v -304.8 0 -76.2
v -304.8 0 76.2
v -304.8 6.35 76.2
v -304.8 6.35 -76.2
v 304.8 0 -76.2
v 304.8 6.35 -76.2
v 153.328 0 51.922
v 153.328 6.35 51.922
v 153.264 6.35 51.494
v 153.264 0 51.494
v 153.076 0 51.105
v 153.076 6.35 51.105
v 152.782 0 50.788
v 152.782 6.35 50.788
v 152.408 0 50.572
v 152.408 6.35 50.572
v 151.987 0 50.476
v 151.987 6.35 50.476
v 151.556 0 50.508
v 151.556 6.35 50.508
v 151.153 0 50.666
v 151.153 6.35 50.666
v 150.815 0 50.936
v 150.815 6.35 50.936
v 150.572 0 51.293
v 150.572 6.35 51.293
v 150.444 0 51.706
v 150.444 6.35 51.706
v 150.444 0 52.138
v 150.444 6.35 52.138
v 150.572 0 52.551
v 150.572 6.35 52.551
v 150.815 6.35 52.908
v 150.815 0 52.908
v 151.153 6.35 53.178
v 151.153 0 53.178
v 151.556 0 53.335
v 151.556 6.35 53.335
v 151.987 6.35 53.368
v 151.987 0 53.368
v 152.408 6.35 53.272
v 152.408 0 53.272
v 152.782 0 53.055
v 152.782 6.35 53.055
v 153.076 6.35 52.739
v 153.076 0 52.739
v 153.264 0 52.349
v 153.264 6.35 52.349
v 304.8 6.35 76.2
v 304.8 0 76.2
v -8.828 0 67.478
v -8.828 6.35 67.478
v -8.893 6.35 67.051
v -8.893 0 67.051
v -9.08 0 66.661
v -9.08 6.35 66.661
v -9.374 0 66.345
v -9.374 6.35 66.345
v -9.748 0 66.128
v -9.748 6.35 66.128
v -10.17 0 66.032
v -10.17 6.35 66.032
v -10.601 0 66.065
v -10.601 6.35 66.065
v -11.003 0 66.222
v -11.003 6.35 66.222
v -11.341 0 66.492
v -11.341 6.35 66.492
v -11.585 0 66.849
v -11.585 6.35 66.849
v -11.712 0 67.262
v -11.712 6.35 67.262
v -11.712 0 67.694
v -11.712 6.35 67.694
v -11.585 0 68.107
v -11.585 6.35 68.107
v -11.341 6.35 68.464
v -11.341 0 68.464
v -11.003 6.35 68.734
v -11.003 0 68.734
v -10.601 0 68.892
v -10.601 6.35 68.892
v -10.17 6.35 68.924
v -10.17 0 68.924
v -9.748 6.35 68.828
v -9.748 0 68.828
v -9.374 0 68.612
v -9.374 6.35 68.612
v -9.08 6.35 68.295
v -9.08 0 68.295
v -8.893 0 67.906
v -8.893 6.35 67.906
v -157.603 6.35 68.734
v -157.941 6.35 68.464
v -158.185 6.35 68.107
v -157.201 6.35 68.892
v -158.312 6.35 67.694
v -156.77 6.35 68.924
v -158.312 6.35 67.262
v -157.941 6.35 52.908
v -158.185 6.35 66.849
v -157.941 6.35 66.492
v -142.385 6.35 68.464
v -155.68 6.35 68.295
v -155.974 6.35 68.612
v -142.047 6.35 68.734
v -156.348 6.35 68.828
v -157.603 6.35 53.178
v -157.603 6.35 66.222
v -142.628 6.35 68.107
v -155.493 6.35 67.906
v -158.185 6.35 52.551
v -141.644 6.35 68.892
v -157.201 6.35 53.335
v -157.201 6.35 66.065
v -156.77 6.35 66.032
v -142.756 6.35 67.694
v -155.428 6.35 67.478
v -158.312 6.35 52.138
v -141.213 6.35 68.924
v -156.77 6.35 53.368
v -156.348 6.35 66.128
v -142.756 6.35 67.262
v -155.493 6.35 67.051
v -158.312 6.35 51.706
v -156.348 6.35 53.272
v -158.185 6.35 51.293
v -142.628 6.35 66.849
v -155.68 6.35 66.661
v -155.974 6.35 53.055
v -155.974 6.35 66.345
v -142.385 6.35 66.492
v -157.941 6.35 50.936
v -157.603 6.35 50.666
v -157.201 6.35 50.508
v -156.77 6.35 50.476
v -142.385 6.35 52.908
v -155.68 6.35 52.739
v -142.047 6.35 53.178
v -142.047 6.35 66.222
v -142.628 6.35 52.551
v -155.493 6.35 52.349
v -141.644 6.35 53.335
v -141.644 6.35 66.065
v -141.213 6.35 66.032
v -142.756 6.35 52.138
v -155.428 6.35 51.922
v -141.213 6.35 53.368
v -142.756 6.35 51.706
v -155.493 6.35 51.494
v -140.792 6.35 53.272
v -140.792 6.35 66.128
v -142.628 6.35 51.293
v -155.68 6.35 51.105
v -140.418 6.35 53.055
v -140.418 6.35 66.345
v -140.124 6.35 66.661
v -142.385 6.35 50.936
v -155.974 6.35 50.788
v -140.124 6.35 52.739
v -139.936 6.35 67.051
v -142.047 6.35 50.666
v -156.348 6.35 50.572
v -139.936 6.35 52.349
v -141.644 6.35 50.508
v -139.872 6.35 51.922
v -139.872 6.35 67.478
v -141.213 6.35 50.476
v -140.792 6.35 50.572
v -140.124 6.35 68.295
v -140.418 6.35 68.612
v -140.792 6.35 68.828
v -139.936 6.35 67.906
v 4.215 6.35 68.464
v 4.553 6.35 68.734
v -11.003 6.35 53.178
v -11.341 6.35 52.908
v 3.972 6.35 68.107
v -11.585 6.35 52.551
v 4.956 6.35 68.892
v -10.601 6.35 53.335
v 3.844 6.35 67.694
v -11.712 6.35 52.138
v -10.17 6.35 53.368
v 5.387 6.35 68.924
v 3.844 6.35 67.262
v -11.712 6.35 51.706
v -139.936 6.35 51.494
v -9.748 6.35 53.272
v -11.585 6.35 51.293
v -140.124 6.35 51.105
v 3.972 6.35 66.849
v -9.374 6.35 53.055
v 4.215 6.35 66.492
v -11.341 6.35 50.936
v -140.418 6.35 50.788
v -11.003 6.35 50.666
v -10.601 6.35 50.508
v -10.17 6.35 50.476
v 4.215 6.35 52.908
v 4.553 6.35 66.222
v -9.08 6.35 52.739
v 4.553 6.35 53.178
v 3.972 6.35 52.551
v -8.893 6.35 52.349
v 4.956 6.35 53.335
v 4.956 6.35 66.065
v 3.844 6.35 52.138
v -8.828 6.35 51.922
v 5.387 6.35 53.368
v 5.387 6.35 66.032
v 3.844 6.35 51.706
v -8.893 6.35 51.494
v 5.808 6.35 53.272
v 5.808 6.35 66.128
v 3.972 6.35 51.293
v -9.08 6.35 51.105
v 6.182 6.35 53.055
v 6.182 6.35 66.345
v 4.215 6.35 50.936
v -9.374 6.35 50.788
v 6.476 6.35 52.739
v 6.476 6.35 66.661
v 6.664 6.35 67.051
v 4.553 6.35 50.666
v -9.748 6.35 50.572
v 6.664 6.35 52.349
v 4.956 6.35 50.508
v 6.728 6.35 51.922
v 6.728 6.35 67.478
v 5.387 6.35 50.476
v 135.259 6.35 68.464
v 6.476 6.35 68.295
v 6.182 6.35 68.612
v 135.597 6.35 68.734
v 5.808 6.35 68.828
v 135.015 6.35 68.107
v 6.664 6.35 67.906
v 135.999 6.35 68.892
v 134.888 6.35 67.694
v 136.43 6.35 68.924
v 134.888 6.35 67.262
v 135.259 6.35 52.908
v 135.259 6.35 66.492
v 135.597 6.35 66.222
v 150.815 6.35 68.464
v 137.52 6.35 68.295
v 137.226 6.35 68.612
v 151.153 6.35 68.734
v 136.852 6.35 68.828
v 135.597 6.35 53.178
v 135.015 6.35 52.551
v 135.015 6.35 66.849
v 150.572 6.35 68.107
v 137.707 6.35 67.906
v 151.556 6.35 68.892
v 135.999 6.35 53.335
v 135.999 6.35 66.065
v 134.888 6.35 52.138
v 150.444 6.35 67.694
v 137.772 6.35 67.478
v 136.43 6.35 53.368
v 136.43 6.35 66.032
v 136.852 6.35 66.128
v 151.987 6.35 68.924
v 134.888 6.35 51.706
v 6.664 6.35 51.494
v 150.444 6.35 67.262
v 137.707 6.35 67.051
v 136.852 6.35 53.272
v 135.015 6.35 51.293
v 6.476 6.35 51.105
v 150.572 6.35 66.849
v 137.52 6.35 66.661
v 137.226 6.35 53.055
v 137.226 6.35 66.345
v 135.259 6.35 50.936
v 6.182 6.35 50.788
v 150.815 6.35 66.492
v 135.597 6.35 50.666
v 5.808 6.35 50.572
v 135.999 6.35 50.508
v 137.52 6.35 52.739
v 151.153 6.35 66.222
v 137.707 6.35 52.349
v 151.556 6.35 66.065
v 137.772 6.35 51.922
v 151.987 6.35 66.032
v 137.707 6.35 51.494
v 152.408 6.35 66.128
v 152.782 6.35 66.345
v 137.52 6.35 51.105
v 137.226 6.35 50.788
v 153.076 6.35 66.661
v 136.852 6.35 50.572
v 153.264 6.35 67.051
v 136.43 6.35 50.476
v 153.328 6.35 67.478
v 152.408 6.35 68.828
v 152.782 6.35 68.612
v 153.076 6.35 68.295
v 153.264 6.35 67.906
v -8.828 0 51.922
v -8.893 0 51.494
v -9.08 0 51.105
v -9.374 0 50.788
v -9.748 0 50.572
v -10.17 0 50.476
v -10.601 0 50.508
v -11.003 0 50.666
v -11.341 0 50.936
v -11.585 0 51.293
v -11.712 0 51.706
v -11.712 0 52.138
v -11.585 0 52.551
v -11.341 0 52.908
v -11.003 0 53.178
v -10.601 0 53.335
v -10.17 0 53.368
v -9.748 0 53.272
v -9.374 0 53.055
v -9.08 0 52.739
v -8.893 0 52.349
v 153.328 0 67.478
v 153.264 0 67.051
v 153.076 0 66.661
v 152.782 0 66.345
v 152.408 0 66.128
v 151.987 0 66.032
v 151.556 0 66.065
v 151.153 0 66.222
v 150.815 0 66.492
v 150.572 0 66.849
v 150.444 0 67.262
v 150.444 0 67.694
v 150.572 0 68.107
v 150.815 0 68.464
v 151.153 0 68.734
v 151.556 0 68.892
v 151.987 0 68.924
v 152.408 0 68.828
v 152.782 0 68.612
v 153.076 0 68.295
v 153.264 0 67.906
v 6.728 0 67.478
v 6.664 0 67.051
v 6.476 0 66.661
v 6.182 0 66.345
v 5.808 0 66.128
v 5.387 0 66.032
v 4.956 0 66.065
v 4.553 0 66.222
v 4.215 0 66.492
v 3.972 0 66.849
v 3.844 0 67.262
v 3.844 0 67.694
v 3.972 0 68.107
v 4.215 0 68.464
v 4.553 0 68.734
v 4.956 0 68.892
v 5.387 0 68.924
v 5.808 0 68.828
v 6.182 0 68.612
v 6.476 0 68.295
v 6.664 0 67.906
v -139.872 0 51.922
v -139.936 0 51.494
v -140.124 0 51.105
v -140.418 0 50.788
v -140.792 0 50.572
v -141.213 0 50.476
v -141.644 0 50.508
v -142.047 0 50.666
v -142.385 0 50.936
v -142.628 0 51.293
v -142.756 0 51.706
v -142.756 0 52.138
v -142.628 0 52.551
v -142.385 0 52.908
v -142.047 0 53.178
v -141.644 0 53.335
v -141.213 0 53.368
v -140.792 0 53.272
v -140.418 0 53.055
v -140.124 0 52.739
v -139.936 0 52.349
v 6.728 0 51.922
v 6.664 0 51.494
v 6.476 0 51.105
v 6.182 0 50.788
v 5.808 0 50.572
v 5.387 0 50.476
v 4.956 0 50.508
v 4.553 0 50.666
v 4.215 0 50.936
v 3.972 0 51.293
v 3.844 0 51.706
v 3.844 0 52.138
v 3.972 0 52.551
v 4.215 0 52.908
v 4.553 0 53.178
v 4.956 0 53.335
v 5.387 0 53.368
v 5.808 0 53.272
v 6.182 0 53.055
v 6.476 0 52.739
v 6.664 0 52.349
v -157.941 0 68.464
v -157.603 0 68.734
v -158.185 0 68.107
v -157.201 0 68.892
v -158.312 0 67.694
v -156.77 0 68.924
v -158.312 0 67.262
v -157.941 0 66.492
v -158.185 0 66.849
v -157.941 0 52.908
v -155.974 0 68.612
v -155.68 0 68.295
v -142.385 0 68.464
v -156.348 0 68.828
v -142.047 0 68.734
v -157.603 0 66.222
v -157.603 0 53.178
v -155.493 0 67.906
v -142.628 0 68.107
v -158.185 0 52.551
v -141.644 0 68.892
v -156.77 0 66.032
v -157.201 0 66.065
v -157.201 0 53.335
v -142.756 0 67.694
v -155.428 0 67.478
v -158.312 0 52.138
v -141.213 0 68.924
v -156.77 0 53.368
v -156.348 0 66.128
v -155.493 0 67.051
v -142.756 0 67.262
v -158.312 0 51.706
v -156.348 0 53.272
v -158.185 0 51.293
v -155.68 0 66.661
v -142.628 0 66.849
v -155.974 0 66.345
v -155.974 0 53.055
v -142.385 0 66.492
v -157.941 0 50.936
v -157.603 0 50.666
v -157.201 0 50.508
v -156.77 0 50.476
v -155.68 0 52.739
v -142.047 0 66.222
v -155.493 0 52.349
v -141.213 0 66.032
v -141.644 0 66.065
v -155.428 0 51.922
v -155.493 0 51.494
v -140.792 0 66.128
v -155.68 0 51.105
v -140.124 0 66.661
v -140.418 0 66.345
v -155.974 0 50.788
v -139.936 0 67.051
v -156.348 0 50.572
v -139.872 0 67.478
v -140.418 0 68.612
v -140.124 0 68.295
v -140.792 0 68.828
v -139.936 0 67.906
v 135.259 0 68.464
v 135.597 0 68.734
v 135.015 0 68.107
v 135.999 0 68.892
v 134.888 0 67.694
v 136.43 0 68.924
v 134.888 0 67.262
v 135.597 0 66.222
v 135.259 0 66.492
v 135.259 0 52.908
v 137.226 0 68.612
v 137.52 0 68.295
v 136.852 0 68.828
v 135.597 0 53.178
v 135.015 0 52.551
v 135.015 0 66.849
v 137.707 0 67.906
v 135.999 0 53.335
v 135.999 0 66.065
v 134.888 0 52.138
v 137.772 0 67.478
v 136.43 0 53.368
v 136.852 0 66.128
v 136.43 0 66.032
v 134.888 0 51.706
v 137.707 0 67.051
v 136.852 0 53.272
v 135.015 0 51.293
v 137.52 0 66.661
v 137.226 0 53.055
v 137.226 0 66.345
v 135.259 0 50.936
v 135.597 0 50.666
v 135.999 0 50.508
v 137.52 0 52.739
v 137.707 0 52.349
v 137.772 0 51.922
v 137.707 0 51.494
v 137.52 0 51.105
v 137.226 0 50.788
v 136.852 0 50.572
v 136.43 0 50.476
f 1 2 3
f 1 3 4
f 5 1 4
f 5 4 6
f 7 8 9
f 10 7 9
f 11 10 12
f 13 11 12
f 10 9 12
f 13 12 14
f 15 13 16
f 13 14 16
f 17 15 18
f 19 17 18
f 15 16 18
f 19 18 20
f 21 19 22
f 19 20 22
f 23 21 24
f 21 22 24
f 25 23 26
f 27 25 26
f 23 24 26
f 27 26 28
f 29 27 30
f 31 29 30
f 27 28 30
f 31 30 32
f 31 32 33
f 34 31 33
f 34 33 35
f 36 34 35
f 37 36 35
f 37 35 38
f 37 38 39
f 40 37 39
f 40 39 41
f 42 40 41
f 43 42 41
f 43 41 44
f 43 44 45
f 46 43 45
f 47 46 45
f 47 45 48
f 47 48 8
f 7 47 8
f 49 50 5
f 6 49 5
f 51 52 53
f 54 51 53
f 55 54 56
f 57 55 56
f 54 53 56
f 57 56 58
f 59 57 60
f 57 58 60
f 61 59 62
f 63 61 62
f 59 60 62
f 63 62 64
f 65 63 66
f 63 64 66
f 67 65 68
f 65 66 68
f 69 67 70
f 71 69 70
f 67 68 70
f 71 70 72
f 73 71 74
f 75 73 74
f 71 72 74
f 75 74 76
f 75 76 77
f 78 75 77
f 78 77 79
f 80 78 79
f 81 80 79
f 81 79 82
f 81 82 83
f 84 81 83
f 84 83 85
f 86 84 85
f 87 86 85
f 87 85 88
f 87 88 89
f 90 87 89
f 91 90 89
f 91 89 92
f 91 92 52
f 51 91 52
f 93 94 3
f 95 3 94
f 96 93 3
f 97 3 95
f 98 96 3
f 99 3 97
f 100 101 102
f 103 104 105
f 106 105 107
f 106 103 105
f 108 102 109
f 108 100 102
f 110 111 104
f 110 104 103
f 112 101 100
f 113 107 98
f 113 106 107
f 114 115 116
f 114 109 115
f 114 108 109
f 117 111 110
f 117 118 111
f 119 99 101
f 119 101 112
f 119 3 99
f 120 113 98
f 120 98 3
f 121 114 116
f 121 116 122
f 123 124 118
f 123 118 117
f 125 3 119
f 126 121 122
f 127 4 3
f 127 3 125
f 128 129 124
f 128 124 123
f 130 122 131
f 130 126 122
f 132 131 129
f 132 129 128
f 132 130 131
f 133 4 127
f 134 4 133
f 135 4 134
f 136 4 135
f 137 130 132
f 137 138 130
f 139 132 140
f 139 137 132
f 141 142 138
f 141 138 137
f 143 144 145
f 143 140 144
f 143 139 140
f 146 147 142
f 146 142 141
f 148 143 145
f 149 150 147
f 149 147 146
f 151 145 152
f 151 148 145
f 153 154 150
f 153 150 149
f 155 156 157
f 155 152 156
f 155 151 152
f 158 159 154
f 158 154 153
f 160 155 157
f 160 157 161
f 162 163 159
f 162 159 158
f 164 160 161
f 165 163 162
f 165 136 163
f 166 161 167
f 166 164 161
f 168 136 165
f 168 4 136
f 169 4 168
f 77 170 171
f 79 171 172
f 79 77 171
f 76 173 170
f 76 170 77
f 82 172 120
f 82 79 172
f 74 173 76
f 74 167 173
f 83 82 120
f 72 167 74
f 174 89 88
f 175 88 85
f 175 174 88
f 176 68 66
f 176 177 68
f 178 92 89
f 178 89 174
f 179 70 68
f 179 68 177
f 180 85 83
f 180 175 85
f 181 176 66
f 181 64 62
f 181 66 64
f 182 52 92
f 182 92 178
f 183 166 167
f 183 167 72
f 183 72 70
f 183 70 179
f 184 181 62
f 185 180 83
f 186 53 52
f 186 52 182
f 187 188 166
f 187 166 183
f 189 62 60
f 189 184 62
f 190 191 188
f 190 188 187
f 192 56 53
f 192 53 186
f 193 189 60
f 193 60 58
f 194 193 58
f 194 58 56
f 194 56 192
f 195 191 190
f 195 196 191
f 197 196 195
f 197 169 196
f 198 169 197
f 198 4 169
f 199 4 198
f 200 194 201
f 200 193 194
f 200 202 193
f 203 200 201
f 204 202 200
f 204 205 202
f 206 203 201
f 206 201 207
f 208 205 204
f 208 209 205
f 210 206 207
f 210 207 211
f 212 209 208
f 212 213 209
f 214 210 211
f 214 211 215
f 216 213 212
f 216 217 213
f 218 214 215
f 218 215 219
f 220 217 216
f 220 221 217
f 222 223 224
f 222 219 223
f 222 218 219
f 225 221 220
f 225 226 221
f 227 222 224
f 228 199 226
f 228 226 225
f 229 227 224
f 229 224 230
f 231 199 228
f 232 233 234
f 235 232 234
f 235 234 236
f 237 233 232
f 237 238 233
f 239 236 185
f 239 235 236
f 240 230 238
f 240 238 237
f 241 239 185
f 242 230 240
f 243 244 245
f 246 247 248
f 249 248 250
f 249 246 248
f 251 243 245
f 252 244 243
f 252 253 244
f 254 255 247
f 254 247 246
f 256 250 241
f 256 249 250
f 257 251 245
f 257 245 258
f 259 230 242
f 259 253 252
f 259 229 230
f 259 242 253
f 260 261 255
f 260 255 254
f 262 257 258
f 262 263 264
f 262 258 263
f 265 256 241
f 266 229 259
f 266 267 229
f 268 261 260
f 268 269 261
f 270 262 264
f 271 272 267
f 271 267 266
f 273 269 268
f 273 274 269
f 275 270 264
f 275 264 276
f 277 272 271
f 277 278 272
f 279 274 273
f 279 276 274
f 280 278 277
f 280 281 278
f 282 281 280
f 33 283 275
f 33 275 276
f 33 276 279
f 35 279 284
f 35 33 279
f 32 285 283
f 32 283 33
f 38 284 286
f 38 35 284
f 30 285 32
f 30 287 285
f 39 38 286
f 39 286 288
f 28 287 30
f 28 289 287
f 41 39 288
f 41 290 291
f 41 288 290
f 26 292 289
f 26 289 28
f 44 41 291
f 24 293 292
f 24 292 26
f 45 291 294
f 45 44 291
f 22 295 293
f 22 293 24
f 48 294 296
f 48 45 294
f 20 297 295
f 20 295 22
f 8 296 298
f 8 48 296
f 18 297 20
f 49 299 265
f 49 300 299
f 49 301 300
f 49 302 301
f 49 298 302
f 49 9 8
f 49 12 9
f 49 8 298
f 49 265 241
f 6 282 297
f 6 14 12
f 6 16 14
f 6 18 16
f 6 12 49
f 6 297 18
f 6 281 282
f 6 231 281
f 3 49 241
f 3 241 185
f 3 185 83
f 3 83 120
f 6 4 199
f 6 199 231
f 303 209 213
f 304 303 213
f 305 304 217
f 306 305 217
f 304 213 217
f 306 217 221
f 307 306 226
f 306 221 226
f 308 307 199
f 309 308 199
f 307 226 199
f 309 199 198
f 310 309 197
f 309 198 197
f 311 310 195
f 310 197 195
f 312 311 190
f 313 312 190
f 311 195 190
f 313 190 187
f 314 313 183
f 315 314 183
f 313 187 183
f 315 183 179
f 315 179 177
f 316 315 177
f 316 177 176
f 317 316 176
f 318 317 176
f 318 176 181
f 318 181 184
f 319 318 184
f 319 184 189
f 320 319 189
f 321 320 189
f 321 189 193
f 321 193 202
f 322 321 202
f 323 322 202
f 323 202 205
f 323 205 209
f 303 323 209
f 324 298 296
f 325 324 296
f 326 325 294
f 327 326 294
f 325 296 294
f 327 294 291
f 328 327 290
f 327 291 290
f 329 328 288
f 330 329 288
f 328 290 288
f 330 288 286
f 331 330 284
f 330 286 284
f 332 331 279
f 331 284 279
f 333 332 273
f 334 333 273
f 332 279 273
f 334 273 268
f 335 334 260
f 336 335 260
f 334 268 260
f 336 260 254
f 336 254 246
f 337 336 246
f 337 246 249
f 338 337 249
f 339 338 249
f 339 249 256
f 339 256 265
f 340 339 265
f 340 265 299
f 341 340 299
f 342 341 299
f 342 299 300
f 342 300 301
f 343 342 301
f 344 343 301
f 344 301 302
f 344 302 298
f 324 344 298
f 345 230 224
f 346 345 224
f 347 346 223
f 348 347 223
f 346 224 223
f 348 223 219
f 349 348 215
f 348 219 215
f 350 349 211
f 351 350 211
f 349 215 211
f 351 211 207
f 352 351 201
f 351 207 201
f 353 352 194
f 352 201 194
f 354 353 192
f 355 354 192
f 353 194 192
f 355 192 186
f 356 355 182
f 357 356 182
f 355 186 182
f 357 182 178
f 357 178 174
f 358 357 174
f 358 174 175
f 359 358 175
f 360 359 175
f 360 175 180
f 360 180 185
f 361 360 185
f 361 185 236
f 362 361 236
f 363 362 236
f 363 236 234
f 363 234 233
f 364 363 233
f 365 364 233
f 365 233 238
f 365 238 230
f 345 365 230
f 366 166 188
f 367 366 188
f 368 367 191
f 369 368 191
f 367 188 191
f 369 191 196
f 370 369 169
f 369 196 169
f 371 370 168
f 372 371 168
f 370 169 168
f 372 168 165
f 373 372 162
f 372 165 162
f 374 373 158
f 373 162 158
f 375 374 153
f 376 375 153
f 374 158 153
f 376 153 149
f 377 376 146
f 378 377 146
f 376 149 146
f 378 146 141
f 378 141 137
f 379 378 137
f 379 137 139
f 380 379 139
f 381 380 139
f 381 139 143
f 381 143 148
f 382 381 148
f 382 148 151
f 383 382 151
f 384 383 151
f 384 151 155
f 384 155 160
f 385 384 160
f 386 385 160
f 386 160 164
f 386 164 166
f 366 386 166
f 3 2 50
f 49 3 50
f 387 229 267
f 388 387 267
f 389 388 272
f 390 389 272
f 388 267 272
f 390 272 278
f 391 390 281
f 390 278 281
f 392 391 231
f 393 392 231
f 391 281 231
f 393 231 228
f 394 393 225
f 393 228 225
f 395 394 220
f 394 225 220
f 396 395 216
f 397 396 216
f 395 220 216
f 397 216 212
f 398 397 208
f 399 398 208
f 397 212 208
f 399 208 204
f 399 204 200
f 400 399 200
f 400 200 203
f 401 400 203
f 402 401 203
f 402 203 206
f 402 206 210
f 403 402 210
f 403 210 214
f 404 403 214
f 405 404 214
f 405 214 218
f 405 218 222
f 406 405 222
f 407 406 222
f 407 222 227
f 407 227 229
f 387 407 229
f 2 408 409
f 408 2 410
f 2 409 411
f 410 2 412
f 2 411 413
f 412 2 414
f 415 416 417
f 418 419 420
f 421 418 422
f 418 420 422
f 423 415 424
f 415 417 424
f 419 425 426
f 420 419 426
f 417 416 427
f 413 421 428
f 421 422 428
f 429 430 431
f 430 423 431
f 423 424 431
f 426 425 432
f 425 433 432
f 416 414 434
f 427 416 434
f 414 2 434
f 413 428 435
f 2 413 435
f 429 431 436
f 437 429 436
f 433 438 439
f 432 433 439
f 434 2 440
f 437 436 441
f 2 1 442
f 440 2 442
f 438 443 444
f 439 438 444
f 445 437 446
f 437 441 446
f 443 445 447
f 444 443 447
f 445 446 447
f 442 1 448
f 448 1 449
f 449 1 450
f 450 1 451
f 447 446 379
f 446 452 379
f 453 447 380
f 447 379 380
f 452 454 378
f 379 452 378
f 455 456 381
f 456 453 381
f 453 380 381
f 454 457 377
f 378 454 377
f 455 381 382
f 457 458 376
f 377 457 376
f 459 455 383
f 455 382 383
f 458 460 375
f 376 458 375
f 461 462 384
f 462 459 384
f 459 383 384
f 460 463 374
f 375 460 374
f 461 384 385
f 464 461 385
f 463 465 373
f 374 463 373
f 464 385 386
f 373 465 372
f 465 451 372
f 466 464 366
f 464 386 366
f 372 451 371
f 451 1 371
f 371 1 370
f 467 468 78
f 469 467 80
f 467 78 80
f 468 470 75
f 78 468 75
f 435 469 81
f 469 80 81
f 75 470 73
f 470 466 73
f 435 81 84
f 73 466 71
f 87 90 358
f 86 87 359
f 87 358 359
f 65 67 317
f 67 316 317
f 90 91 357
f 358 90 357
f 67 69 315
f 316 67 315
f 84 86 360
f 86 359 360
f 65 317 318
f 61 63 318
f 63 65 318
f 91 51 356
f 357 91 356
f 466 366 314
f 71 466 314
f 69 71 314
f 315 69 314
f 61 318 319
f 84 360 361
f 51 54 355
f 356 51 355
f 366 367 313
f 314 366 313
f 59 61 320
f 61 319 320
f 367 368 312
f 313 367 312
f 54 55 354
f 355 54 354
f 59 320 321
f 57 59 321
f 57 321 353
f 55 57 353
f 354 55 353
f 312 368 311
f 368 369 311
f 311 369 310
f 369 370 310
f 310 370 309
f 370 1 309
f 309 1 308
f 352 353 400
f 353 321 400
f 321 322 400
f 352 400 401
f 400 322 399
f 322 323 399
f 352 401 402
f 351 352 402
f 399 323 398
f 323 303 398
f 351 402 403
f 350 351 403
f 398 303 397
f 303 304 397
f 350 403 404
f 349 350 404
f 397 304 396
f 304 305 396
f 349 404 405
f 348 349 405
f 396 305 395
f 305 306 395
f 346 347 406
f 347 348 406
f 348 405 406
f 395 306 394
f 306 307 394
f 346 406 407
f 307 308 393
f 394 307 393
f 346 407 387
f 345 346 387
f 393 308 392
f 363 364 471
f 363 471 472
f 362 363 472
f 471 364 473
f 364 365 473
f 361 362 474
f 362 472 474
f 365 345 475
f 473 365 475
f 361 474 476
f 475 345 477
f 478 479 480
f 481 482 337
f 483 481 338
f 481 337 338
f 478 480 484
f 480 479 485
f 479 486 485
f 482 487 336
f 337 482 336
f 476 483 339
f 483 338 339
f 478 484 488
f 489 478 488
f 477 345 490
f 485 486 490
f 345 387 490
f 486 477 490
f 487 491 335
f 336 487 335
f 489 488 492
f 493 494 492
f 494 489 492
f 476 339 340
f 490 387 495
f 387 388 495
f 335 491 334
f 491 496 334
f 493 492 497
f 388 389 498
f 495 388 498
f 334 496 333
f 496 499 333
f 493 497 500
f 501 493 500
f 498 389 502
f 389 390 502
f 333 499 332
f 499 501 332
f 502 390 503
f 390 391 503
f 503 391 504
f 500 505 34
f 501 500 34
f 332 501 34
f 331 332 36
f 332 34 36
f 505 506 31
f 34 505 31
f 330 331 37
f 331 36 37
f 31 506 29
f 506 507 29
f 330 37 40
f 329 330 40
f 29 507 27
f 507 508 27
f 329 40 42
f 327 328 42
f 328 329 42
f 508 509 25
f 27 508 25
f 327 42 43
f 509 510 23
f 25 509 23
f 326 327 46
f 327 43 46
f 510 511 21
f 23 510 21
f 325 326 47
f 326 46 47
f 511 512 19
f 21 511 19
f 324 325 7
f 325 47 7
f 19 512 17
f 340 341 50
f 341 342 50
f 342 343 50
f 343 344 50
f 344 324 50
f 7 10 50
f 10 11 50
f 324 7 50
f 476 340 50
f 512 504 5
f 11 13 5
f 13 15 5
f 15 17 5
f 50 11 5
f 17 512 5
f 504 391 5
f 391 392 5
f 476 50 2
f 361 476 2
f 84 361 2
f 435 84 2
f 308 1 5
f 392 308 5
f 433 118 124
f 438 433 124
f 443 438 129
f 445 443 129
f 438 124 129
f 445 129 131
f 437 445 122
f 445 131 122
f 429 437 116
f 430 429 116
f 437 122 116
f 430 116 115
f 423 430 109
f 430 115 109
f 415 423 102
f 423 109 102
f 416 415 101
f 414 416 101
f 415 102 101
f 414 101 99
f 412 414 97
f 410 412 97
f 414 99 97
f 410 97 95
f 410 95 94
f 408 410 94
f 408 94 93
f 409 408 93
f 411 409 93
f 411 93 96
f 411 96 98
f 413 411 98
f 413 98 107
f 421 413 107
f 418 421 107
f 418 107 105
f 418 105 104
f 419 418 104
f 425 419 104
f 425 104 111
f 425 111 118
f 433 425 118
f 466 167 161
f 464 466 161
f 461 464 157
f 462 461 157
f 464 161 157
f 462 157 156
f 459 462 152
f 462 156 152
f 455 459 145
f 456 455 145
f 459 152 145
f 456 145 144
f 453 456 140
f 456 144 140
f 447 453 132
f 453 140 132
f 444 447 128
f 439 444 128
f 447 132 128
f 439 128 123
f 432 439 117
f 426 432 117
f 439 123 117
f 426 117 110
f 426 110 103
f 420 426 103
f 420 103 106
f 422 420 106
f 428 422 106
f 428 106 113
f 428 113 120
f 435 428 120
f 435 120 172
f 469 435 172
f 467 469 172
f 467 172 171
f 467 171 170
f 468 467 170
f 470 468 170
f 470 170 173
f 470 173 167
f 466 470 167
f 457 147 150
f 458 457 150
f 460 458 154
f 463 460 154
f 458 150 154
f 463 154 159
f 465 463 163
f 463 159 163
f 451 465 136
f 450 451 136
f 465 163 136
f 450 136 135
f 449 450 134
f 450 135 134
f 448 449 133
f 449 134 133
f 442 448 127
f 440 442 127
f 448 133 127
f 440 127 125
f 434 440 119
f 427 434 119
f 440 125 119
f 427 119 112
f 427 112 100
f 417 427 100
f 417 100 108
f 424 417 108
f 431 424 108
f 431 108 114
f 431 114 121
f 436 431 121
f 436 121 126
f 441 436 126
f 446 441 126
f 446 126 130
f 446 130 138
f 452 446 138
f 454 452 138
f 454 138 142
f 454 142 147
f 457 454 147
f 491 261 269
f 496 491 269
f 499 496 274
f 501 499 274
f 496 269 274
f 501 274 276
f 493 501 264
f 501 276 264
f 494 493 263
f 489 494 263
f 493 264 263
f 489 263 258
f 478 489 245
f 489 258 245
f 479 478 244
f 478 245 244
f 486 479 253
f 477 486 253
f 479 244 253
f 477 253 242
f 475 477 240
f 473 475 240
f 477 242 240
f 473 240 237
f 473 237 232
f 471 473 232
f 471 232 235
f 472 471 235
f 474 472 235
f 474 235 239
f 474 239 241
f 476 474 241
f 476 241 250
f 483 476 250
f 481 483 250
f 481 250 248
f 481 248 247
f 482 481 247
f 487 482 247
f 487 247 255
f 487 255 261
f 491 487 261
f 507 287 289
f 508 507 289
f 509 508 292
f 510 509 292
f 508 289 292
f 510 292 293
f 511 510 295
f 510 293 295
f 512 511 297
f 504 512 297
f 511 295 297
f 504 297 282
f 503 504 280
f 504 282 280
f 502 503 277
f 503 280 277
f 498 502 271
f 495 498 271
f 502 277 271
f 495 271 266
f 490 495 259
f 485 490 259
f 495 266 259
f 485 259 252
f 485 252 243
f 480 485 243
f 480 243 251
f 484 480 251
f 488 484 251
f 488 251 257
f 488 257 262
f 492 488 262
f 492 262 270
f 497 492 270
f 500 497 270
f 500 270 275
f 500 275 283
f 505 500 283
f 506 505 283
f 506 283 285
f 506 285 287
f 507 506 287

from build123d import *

# Parameters (mm, degrees)
SKETCH1_W              = 609.6
SKETCH1_H              = 152.4
BOSS_EXTRUDE1_DEPTH    = 6.35
M2_5_CLEARANCE_HOLE1_D = 2.9


with BuildPart() as part:
    # Sketch1 → Boss-Extrude1 (new body)
    with BuildSketch(Plane(origin=(0, 0, 0), x_dir=(1, 0, 0), z_dir=(0, 1, 0))):
        Rectangle(SKETCH1_W, SKETCH1_H)
    extrude(amount=BOSS_EXTRUDE1_DEPTH)

    # M2.5 Clearance Hole1 (through all)
    with Locations(Plane(origin=(0, 0, 0), x_dir=(-1, 0, 0), z_dir=(0, -1, 0))):
        with Locations((156.878174593, -51.921825407), (141.321825407, -51.921825407), (141.321825407, -67.478174593), (156.878174593, -67.478174593), (10.278174593, -51.921825407), (10.278174593, -67.478174593), (-5.278174593, -67.478174593), (-5.278174593, -51.921825407), (-136.321825407, -51.921825407), (-136.321825407, -67.478174593), (-151.878174593, -67.478174593), (-151.878174593, -51.921825407)):
            Hole(M2_5_CLEARANCE_HOLE1_D / 2)


solid = part.part
